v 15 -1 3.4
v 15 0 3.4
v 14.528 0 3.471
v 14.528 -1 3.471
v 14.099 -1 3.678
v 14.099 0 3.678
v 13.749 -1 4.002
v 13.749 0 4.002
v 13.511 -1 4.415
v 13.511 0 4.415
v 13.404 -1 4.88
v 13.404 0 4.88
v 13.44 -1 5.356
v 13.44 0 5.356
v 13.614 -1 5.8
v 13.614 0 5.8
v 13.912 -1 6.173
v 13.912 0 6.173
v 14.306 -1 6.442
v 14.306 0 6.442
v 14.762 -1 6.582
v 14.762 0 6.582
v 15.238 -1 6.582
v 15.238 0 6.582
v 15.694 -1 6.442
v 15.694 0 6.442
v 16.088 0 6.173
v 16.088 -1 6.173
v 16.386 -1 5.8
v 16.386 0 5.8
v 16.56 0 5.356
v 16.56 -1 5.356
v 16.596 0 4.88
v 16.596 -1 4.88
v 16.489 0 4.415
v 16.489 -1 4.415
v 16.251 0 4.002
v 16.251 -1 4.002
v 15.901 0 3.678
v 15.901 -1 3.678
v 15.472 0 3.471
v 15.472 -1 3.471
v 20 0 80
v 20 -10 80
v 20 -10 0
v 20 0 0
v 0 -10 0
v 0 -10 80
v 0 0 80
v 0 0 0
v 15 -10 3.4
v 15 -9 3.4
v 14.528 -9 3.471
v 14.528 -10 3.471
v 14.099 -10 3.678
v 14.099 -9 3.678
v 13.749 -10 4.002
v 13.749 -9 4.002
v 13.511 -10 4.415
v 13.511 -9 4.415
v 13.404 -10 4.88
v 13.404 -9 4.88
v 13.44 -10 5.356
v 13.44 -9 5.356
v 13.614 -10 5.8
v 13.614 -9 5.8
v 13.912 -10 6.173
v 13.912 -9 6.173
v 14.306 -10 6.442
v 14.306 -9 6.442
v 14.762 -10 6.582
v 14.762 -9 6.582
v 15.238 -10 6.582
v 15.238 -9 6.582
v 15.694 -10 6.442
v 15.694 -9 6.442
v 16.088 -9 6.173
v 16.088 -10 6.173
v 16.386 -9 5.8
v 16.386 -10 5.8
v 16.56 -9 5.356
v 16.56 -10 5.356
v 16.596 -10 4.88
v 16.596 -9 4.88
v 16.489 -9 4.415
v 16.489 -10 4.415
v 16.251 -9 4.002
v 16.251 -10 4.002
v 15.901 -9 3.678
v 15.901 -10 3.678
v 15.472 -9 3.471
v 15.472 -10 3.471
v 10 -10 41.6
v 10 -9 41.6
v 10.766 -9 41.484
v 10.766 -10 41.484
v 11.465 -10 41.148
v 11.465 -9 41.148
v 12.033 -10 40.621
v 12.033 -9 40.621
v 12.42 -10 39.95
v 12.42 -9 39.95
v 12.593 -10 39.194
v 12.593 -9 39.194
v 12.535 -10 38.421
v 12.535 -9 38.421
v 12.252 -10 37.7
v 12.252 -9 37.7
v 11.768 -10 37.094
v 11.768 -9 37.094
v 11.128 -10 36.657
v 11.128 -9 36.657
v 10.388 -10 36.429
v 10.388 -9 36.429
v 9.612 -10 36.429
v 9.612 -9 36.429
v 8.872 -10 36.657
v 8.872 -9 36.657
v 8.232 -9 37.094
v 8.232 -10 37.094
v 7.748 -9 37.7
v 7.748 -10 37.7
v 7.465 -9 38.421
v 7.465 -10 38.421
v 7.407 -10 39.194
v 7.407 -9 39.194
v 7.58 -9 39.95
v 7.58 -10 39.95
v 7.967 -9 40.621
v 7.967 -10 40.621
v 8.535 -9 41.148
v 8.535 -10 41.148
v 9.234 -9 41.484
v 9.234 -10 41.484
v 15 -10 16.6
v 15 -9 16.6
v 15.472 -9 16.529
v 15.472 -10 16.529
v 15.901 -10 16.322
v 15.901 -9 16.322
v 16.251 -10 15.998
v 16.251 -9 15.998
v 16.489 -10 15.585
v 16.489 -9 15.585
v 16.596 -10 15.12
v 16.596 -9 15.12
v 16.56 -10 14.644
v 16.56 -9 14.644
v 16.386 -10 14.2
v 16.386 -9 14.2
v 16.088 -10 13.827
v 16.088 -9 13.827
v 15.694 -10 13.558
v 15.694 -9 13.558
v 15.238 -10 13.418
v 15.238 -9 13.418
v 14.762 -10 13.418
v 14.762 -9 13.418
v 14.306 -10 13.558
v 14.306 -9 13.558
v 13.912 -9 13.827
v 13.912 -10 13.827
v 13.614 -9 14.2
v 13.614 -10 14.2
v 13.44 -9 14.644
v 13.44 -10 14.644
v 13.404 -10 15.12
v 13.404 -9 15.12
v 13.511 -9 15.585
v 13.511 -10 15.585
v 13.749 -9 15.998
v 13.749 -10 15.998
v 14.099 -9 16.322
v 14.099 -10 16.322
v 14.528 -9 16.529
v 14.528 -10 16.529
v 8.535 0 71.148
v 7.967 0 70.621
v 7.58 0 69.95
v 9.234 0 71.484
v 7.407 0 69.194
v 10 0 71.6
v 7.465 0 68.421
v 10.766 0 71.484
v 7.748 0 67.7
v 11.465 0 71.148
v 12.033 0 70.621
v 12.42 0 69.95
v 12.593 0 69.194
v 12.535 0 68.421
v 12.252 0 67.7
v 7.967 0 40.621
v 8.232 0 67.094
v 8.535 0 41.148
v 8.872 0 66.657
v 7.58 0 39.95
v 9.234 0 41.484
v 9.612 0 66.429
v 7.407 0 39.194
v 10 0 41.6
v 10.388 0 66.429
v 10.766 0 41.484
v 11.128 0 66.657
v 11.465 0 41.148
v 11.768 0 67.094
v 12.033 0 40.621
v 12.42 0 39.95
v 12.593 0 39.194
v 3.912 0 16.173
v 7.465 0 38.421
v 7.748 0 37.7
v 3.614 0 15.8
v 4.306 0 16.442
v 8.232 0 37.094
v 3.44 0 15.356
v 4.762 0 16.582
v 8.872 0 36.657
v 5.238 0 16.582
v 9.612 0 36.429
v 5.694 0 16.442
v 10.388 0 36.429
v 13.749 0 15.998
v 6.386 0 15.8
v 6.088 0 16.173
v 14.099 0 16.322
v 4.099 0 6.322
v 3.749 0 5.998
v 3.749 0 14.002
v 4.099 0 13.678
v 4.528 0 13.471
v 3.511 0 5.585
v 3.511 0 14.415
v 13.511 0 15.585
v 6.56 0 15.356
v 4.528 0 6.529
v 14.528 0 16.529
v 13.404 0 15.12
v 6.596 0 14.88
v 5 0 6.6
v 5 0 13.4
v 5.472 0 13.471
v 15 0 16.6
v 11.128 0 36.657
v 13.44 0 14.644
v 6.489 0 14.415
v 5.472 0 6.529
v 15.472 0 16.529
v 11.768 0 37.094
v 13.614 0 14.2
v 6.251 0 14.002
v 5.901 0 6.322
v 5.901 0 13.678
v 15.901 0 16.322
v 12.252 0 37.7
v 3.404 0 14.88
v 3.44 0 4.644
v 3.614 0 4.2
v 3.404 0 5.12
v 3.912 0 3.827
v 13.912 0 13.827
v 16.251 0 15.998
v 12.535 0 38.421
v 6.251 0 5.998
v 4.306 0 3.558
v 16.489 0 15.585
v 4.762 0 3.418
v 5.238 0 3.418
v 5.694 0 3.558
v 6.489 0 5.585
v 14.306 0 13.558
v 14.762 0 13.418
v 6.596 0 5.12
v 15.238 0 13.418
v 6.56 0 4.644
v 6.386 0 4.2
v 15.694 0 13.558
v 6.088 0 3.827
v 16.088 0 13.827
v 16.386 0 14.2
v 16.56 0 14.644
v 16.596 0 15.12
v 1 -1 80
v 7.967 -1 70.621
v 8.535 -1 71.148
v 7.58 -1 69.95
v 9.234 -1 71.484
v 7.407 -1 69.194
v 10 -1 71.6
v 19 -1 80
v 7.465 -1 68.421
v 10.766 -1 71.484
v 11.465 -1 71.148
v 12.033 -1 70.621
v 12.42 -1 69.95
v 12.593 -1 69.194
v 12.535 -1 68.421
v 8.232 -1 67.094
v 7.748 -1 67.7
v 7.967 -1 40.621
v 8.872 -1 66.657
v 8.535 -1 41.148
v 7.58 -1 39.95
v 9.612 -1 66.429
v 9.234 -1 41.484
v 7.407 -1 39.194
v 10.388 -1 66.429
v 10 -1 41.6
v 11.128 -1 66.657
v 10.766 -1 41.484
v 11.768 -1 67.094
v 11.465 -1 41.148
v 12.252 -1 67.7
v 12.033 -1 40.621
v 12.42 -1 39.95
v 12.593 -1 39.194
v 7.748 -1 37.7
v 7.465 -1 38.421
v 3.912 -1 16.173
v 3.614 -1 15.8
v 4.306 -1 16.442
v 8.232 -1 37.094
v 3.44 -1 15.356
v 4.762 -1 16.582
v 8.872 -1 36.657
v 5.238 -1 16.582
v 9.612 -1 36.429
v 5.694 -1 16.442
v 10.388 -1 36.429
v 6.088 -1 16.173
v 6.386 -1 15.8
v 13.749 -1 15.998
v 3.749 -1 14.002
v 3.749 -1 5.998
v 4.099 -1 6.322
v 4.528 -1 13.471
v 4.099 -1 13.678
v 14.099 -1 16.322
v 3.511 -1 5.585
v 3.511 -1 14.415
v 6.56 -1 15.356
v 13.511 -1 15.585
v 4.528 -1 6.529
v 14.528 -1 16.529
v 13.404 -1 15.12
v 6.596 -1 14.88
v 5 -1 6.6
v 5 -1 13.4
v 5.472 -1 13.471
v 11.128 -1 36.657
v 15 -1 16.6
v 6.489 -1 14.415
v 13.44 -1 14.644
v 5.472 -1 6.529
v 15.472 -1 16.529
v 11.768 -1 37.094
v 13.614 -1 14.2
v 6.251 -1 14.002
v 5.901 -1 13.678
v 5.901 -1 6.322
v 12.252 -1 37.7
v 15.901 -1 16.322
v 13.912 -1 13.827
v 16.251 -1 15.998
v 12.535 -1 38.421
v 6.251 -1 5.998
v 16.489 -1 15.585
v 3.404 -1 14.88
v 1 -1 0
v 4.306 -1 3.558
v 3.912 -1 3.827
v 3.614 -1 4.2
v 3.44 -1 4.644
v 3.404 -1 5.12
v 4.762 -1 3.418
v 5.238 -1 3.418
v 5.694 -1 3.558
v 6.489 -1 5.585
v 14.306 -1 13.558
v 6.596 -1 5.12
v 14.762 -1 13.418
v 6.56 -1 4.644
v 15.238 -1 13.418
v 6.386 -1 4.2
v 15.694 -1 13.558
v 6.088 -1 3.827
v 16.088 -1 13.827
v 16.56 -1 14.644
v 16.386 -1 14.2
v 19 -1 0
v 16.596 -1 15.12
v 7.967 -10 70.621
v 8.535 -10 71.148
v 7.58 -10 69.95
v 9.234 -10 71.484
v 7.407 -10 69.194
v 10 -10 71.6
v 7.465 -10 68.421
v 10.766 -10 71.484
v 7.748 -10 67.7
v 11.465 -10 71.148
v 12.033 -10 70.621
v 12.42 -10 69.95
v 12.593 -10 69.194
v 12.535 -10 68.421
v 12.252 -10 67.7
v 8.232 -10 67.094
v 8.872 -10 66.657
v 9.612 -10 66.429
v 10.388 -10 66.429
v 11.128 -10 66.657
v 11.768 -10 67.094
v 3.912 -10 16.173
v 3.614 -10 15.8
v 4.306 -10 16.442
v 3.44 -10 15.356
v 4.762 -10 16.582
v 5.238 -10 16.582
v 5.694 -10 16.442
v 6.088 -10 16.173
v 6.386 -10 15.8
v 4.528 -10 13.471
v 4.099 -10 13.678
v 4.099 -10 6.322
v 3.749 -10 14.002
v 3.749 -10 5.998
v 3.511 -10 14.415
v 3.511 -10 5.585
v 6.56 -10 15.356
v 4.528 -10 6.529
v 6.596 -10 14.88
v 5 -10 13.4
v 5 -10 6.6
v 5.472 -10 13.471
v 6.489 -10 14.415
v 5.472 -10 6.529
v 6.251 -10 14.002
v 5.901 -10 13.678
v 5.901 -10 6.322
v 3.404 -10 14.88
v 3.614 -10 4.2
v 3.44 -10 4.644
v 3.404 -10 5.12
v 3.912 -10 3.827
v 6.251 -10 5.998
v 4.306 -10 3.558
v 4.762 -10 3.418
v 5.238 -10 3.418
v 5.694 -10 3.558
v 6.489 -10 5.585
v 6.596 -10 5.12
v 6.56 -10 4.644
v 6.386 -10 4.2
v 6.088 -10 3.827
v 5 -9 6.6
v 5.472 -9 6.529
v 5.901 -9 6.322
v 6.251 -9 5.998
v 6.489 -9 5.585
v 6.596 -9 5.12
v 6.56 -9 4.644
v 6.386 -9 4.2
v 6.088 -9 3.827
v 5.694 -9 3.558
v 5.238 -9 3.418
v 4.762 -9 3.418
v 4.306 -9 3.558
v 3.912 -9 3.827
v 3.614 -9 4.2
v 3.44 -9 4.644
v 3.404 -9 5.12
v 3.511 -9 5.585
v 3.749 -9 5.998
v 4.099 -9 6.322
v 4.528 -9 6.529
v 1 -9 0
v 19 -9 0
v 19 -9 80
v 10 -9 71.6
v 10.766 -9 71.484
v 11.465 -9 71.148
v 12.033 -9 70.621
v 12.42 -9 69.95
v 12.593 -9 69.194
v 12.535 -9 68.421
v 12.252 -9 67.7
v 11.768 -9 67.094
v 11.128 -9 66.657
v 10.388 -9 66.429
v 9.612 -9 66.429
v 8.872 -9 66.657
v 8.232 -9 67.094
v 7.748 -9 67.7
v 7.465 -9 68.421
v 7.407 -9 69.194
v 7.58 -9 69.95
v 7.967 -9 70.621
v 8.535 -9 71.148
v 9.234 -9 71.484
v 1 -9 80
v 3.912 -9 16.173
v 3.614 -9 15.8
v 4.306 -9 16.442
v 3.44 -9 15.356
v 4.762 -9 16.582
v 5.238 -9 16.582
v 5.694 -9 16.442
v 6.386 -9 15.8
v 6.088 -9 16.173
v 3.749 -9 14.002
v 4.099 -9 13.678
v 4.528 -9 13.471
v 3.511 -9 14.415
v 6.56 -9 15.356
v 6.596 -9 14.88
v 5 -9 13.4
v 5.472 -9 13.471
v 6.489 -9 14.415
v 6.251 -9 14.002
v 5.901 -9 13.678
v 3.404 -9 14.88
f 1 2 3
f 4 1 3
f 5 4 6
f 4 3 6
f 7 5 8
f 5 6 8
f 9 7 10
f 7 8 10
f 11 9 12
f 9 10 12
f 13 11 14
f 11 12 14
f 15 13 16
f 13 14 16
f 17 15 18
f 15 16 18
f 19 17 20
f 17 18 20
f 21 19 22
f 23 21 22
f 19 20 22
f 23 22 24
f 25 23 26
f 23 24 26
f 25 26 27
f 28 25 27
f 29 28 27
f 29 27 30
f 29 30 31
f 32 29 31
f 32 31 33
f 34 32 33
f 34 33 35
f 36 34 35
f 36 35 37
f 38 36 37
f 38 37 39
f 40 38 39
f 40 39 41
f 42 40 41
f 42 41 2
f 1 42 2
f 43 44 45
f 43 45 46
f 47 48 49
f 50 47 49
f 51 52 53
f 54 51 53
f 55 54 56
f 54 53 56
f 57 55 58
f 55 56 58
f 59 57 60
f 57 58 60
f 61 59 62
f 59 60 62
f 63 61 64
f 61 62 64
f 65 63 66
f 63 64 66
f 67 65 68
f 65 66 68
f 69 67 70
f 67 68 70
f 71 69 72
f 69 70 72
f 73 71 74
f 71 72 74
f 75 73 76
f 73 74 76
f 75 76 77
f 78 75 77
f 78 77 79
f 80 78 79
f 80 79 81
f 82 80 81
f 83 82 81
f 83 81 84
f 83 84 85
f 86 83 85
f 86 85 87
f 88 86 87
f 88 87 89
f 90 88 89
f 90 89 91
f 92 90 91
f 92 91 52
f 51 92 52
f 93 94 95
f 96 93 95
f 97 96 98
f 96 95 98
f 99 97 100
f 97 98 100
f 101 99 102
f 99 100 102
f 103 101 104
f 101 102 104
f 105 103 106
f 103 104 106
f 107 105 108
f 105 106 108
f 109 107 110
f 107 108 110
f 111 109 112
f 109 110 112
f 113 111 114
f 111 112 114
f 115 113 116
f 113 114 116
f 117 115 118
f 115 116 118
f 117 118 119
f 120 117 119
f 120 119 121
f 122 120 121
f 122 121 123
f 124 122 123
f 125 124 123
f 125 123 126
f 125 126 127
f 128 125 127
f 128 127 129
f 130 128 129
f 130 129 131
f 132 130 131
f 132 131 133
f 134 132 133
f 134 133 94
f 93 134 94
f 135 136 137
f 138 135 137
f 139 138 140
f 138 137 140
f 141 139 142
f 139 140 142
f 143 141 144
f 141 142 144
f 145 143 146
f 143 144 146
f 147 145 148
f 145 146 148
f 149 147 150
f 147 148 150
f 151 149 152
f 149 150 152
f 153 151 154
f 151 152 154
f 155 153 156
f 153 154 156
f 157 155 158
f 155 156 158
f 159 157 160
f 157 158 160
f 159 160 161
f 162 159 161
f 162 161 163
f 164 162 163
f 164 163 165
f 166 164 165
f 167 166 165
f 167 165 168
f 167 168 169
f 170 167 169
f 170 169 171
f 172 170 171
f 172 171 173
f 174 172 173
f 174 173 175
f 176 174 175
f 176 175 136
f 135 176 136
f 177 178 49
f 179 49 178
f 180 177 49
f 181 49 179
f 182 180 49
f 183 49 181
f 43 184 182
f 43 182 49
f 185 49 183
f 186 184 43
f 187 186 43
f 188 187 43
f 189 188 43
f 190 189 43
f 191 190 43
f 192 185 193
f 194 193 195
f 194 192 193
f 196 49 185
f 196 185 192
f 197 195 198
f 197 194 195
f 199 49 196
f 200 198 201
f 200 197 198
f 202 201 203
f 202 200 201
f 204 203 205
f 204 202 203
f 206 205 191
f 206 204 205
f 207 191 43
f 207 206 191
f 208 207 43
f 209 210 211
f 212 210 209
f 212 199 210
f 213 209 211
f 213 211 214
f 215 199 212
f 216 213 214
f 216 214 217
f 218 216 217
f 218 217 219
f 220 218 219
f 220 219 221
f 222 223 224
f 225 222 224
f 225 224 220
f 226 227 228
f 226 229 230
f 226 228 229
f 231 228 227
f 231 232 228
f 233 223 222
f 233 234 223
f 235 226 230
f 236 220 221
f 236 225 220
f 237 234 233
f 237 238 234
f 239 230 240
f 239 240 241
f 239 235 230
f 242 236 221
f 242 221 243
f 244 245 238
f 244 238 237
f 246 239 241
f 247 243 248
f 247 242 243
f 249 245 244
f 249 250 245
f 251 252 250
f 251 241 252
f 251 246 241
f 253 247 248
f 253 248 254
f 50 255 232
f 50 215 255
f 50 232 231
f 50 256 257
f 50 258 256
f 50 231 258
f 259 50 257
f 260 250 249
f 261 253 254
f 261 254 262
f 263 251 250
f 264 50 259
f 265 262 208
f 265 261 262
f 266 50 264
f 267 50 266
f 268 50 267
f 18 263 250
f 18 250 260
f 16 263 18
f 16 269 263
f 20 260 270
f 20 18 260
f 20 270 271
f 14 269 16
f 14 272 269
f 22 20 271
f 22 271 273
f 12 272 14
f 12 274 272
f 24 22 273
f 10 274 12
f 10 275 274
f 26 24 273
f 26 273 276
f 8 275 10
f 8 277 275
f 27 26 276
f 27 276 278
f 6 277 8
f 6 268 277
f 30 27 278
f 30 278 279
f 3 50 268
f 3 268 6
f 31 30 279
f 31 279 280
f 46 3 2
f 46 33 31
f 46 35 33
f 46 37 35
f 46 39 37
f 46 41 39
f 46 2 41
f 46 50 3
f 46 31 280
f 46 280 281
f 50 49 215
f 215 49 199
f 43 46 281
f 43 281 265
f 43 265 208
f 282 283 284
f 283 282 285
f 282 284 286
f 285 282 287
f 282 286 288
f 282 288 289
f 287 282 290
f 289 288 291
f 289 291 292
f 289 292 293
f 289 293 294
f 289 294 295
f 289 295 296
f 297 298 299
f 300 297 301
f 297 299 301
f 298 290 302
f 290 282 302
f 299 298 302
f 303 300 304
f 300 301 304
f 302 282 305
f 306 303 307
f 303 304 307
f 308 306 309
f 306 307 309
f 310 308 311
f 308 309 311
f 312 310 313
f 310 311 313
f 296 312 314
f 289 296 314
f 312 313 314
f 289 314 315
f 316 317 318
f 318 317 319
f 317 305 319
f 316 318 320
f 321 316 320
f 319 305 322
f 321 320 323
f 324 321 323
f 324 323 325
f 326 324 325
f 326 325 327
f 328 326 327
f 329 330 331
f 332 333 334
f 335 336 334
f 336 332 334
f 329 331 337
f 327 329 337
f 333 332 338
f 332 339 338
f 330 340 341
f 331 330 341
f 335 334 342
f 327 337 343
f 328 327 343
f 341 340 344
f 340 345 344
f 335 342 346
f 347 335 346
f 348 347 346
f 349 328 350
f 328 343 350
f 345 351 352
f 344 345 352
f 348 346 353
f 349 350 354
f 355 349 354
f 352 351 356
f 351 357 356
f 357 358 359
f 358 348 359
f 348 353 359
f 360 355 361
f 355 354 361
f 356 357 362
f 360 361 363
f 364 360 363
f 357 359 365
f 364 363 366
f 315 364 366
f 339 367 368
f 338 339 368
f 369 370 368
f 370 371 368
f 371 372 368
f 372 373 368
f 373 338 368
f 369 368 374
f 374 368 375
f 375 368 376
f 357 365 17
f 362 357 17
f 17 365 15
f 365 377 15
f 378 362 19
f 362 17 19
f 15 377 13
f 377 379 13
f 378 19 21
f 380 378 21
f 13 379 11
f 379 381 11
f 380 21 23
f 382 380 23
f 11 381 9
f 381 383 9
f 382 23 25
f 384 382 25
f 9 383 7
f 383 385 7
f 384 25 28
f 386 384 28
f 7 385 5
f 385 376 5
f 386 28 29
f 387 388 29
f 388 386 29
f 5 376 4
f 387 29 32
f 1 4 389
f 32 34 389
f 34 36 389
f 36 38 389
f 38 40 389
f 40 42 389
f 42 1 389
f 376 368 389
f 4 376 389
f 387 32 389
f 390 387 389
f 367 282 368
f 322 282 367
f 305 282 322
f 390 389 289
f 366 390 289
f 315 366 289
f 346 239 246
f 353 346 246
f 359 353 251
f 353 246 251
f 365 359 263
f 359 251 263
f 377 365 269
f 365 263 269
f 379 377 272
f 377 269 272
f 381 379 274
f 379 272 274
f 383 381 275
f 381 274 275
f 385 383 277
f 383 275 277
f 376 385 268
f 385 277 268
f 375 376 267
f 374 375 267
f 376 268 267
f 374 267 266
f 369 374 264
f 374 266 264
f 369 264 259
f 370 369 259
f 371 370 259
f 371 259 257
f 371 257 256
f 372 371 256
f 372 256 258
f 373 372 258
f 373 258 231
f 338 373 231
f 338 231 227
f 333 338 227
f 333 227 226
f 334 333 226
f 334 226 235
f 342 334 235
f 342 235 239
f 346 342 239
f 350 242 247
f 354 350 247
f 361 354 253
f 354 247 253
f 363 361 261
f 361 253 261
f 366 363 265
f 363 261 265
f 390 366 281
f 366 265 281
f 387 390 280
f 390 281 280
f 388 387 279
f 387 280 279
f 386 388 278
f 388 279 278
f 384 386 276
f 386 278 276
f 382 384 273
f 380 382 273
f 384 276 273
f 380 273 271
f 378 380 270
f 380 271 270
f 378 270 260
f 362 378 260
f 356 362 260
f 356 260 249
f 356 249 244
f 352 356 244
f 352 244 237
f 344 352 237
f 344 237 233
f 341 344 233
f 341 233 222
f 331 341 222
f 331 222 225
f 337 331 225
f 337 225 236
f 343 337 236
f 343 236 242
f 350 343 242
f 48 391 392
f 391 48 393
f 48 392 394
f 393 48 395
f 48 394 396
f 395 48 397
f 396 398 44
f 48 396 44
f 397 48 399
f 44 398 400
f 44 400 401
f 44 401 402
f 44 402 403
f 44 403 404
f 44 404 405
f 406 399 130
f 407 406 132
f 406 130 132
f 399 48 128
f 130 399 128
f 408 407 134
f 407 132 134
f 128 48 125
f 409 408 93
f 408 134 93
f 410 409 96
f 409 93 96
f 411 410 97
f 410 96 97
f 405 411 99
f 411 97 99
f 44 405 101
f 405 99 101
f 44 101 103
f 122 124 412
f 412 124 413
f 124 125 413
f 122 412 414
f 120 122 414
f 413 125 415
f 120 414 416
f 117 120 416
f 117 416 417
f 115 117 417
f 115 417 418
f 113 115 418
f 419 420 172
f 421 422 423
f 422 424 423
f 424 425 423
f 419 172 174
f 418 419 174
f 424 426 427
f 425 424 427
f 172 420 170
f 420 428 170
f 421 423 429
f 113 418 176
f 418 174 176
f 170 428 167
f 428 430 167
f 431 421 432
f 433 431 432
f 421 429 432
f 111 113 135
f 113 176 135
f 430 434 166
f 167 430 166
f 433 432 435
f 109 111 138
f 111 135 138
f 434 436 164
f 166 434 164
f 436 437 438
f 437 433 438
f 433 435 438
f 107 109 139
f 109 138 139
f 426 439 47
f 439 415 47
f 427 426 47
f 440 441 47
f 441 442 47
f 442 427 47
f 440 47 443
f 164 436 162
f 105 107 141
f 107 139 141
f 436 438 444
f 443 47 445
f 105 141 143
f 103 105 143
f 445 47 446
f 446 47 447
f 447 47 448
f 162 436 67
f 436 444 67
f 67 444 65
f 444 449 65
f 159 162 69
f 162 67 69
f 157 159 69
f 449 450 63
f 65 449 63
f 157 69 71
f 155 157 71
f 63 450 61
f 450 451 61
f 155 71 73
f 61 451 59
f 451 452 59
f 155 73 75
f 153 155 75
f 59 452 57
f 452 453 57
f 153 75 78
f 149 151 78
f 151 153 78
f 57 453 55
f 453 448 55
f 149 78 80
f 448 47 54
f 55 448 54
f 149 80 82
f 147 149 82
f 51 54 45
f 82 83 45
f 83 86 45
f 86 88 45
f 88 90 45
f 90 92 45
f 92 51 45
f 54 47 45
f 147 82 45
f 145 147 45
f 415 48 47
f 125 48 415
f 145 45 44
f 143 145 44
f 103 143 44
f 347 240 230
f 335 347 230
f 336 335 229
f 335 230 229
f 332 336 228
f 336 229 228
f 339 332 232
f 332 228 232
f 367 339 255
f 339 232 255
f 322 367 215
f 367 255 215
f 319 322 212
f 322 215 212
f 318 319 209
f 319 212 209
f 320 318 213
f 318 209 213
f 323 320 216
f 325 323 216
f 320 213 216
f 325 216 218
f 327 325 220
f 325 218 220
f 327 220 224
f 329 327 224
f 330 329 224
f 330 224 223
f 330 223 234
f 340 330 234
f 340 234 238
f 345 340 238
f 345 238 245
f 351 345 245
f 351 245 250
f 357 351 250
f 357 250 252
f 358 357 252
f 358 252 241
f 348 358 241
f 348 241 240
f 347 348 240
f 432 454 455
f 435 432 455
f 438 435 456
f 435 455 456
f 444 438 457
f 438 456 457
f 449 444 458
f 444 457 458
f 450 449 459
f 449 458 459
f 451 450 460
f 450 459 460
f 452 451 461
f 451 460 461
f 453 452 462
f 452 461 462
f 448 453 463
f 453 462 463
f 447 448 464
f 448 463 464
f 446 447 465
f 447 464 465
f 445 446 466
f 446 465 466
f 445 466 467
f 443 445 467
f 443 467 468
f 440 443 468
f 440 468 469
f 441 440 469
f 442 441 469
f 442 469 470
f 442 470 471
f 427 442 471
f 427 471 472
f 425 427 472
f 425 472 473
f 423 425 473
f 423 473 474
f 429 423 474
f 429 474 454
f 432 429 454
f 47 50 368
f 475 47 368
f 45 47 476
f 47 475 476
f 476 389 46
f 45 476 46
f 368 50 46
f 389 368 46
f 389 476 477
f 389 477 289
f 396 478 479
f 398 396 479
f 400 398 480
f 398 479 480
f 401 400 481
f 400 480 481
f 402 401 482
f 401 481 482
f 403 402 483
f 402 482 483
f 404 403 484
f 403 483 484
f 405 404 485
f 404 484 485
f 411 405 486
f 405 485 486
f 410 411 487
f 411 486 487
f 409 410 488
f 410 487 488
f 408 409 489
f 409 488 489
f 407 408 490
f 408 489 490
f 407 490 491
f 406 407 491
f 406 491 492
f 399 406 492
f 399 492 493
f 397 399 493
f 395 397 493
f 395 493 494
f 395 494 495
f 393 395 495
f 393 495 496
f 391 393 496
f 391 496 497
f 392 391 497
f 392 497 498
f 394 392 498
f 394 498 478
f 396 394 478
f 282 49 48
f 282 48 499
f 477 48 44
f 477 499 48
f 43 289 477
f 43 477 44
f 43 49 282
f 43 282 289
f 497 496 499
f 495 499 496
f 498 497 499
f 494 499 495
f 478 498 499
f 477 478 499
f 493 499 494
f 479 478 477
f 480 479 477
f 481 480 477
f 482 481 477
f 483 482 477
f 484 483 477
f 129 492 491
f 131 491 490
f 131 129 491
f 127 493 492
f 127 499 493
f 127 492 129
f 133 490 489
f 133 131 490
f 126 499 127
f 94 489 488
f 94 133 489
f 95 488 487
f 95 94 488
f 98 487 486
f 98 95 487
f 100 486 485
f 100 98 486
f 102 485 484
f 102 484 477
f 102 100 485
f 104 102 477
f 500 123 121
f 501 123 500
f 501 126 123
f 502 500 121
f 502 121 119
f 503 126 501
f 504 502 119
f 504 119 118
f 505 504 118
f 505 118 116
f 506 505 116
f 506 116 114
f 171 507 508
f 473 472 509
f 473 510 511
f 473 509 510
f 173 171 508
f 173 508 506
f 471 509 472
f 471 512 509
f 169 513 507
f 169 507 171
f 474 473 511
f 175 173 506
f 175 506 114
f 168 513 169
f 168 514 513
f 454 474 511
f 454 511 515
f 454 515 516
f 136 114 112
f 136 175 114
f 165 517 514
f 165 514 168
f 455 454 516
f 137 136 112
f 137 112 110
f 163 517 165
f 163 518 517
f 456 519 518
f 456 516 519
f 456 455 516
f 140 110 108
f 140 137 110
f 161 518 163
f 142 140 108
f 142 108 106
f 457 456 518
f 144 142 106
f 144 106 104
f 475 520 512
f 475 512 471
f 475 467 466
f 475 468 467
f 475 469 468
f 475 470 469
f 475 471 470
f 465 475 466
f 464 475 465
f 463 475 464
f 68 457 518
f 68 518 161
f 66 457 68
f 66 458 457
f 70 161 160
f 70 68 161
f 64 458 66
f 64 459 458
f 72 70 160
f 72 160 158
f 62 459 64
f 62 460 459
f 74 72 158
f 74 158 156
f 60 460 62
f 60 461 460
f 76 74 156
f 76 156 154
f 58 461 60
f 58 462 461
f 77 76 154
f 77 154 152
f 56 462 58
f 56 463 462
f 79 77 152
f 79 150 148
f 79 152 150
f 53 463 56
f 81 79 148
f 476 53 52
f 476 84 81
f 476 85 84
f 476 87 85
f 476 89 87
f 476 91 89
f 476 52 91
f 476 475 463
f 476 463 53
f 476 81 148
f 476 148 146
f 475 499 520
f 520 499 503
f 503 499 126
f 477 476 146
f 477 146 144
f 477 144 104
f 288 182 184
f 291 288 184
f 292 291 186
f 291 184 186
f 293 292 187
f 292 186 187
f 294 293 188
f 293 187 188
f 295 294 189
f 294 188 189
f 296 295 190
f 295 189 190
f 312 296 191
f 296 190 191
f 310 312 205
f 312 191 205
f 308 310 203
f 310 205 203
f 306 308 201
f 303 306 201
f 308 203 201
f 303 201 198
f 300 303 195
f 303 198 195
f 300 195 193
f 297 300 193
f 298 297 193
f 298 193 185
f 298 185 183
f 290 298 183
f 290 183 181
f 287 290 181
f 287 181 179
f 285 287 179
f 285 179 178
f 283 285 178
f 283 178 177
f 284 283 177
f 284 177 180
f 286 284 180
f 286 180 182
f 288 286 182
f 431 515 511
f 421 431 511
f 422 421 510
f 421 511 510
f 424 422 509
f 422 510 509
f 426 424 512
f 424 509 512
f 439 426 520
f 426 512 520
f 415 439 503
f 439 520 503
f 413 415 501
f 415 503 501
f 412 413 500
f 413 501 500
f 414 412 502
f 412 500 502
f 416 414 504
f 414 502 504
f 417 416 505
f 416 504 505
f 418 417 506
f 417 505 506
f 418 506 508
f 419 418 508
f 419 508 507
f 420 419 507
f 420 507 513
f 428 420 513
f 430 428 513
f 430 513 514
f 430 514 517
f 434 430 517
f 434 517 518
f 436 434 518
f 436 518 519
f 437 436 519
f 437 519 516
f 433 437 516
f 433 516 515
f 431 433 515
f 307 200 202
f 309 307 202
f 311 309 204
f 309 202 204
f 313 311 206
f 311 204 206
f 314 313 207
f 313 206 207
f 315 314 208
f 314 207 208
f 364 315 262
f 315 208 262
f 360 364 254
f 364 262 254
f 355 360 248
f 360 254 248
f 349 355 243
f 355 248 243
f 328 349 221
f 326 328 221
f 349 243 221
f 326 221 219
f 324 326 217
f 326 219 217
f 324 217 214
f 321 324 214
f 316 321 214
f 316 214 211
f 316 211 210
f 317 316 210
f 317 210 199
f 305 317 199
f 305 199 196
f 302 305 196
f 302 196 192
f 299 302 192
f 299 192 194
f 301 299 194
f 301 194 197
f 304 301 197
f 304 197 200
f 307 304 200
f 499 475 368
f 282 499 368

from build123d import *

# Parameters (mm, degrees)
SKETCH_1_W          = 20
SKETCH_1_H          = 10
SKETCH_1_W_2        = 18
SKETCH_1_H_2        = 8
EXTRUDE_1_DEPTH     = 80
SKETCH_3_R          = 1.6
SKETCH_3_R_2        = 2.6
CUT_EXTRUDE_1_DEPTH = 84.066238629


with BuildPart() as part:
    # 草图1 → 拉伸-薄壁1 (new body)
    with BuildSketch(Plane.XY):
        with Locations((10, -5)):
            Rectangle(SKETCH_1_W, SKETCH_1_H)
        with Locations((10, -5)):
            Rectangle(SKETCH_1_W_2, SKETCH_1_H_2, mode=Mode.SUBTRACT)
    extrude(amount=EXTRUDE_1_DEPTH)

    # 草图3 → 切除-拉伸1 (cut, through all)
    with BuildSketch(Plane(origin=(0, 0, 0), x_dir=(1, 0, 0), z_dir=(0, 1, 0))):
        with Locations(Location((5, -5, 0), (0, 0, 270))):
            Circle(SKETCH_3_R)
        with Locations(Location((15, -5, 0), (0, 0, 90))):
            Circle(SKETCH_3_R)
        with Locations(Location((15, -15, 0), (0, 0, 270))):
            Circle(SKETCH_3_R)
        with Locations(Location((5, -15, 0), (0, 0, 90))):
            Circle(SKETCH_3_R)
        with Locations(Location((10, -69, 0), (0, 0, 270))):
            Circle(SKETCH_3_R_2)
        with Locations(Location((10, -39, 0), (0, 0, 270))):
            Circle(SKETCH_3_R_2)
    extrude(amount=-CUT_EXTRUDE_1_DEPTH, mode=Mode.SUBTRACT)


solid = part.part
